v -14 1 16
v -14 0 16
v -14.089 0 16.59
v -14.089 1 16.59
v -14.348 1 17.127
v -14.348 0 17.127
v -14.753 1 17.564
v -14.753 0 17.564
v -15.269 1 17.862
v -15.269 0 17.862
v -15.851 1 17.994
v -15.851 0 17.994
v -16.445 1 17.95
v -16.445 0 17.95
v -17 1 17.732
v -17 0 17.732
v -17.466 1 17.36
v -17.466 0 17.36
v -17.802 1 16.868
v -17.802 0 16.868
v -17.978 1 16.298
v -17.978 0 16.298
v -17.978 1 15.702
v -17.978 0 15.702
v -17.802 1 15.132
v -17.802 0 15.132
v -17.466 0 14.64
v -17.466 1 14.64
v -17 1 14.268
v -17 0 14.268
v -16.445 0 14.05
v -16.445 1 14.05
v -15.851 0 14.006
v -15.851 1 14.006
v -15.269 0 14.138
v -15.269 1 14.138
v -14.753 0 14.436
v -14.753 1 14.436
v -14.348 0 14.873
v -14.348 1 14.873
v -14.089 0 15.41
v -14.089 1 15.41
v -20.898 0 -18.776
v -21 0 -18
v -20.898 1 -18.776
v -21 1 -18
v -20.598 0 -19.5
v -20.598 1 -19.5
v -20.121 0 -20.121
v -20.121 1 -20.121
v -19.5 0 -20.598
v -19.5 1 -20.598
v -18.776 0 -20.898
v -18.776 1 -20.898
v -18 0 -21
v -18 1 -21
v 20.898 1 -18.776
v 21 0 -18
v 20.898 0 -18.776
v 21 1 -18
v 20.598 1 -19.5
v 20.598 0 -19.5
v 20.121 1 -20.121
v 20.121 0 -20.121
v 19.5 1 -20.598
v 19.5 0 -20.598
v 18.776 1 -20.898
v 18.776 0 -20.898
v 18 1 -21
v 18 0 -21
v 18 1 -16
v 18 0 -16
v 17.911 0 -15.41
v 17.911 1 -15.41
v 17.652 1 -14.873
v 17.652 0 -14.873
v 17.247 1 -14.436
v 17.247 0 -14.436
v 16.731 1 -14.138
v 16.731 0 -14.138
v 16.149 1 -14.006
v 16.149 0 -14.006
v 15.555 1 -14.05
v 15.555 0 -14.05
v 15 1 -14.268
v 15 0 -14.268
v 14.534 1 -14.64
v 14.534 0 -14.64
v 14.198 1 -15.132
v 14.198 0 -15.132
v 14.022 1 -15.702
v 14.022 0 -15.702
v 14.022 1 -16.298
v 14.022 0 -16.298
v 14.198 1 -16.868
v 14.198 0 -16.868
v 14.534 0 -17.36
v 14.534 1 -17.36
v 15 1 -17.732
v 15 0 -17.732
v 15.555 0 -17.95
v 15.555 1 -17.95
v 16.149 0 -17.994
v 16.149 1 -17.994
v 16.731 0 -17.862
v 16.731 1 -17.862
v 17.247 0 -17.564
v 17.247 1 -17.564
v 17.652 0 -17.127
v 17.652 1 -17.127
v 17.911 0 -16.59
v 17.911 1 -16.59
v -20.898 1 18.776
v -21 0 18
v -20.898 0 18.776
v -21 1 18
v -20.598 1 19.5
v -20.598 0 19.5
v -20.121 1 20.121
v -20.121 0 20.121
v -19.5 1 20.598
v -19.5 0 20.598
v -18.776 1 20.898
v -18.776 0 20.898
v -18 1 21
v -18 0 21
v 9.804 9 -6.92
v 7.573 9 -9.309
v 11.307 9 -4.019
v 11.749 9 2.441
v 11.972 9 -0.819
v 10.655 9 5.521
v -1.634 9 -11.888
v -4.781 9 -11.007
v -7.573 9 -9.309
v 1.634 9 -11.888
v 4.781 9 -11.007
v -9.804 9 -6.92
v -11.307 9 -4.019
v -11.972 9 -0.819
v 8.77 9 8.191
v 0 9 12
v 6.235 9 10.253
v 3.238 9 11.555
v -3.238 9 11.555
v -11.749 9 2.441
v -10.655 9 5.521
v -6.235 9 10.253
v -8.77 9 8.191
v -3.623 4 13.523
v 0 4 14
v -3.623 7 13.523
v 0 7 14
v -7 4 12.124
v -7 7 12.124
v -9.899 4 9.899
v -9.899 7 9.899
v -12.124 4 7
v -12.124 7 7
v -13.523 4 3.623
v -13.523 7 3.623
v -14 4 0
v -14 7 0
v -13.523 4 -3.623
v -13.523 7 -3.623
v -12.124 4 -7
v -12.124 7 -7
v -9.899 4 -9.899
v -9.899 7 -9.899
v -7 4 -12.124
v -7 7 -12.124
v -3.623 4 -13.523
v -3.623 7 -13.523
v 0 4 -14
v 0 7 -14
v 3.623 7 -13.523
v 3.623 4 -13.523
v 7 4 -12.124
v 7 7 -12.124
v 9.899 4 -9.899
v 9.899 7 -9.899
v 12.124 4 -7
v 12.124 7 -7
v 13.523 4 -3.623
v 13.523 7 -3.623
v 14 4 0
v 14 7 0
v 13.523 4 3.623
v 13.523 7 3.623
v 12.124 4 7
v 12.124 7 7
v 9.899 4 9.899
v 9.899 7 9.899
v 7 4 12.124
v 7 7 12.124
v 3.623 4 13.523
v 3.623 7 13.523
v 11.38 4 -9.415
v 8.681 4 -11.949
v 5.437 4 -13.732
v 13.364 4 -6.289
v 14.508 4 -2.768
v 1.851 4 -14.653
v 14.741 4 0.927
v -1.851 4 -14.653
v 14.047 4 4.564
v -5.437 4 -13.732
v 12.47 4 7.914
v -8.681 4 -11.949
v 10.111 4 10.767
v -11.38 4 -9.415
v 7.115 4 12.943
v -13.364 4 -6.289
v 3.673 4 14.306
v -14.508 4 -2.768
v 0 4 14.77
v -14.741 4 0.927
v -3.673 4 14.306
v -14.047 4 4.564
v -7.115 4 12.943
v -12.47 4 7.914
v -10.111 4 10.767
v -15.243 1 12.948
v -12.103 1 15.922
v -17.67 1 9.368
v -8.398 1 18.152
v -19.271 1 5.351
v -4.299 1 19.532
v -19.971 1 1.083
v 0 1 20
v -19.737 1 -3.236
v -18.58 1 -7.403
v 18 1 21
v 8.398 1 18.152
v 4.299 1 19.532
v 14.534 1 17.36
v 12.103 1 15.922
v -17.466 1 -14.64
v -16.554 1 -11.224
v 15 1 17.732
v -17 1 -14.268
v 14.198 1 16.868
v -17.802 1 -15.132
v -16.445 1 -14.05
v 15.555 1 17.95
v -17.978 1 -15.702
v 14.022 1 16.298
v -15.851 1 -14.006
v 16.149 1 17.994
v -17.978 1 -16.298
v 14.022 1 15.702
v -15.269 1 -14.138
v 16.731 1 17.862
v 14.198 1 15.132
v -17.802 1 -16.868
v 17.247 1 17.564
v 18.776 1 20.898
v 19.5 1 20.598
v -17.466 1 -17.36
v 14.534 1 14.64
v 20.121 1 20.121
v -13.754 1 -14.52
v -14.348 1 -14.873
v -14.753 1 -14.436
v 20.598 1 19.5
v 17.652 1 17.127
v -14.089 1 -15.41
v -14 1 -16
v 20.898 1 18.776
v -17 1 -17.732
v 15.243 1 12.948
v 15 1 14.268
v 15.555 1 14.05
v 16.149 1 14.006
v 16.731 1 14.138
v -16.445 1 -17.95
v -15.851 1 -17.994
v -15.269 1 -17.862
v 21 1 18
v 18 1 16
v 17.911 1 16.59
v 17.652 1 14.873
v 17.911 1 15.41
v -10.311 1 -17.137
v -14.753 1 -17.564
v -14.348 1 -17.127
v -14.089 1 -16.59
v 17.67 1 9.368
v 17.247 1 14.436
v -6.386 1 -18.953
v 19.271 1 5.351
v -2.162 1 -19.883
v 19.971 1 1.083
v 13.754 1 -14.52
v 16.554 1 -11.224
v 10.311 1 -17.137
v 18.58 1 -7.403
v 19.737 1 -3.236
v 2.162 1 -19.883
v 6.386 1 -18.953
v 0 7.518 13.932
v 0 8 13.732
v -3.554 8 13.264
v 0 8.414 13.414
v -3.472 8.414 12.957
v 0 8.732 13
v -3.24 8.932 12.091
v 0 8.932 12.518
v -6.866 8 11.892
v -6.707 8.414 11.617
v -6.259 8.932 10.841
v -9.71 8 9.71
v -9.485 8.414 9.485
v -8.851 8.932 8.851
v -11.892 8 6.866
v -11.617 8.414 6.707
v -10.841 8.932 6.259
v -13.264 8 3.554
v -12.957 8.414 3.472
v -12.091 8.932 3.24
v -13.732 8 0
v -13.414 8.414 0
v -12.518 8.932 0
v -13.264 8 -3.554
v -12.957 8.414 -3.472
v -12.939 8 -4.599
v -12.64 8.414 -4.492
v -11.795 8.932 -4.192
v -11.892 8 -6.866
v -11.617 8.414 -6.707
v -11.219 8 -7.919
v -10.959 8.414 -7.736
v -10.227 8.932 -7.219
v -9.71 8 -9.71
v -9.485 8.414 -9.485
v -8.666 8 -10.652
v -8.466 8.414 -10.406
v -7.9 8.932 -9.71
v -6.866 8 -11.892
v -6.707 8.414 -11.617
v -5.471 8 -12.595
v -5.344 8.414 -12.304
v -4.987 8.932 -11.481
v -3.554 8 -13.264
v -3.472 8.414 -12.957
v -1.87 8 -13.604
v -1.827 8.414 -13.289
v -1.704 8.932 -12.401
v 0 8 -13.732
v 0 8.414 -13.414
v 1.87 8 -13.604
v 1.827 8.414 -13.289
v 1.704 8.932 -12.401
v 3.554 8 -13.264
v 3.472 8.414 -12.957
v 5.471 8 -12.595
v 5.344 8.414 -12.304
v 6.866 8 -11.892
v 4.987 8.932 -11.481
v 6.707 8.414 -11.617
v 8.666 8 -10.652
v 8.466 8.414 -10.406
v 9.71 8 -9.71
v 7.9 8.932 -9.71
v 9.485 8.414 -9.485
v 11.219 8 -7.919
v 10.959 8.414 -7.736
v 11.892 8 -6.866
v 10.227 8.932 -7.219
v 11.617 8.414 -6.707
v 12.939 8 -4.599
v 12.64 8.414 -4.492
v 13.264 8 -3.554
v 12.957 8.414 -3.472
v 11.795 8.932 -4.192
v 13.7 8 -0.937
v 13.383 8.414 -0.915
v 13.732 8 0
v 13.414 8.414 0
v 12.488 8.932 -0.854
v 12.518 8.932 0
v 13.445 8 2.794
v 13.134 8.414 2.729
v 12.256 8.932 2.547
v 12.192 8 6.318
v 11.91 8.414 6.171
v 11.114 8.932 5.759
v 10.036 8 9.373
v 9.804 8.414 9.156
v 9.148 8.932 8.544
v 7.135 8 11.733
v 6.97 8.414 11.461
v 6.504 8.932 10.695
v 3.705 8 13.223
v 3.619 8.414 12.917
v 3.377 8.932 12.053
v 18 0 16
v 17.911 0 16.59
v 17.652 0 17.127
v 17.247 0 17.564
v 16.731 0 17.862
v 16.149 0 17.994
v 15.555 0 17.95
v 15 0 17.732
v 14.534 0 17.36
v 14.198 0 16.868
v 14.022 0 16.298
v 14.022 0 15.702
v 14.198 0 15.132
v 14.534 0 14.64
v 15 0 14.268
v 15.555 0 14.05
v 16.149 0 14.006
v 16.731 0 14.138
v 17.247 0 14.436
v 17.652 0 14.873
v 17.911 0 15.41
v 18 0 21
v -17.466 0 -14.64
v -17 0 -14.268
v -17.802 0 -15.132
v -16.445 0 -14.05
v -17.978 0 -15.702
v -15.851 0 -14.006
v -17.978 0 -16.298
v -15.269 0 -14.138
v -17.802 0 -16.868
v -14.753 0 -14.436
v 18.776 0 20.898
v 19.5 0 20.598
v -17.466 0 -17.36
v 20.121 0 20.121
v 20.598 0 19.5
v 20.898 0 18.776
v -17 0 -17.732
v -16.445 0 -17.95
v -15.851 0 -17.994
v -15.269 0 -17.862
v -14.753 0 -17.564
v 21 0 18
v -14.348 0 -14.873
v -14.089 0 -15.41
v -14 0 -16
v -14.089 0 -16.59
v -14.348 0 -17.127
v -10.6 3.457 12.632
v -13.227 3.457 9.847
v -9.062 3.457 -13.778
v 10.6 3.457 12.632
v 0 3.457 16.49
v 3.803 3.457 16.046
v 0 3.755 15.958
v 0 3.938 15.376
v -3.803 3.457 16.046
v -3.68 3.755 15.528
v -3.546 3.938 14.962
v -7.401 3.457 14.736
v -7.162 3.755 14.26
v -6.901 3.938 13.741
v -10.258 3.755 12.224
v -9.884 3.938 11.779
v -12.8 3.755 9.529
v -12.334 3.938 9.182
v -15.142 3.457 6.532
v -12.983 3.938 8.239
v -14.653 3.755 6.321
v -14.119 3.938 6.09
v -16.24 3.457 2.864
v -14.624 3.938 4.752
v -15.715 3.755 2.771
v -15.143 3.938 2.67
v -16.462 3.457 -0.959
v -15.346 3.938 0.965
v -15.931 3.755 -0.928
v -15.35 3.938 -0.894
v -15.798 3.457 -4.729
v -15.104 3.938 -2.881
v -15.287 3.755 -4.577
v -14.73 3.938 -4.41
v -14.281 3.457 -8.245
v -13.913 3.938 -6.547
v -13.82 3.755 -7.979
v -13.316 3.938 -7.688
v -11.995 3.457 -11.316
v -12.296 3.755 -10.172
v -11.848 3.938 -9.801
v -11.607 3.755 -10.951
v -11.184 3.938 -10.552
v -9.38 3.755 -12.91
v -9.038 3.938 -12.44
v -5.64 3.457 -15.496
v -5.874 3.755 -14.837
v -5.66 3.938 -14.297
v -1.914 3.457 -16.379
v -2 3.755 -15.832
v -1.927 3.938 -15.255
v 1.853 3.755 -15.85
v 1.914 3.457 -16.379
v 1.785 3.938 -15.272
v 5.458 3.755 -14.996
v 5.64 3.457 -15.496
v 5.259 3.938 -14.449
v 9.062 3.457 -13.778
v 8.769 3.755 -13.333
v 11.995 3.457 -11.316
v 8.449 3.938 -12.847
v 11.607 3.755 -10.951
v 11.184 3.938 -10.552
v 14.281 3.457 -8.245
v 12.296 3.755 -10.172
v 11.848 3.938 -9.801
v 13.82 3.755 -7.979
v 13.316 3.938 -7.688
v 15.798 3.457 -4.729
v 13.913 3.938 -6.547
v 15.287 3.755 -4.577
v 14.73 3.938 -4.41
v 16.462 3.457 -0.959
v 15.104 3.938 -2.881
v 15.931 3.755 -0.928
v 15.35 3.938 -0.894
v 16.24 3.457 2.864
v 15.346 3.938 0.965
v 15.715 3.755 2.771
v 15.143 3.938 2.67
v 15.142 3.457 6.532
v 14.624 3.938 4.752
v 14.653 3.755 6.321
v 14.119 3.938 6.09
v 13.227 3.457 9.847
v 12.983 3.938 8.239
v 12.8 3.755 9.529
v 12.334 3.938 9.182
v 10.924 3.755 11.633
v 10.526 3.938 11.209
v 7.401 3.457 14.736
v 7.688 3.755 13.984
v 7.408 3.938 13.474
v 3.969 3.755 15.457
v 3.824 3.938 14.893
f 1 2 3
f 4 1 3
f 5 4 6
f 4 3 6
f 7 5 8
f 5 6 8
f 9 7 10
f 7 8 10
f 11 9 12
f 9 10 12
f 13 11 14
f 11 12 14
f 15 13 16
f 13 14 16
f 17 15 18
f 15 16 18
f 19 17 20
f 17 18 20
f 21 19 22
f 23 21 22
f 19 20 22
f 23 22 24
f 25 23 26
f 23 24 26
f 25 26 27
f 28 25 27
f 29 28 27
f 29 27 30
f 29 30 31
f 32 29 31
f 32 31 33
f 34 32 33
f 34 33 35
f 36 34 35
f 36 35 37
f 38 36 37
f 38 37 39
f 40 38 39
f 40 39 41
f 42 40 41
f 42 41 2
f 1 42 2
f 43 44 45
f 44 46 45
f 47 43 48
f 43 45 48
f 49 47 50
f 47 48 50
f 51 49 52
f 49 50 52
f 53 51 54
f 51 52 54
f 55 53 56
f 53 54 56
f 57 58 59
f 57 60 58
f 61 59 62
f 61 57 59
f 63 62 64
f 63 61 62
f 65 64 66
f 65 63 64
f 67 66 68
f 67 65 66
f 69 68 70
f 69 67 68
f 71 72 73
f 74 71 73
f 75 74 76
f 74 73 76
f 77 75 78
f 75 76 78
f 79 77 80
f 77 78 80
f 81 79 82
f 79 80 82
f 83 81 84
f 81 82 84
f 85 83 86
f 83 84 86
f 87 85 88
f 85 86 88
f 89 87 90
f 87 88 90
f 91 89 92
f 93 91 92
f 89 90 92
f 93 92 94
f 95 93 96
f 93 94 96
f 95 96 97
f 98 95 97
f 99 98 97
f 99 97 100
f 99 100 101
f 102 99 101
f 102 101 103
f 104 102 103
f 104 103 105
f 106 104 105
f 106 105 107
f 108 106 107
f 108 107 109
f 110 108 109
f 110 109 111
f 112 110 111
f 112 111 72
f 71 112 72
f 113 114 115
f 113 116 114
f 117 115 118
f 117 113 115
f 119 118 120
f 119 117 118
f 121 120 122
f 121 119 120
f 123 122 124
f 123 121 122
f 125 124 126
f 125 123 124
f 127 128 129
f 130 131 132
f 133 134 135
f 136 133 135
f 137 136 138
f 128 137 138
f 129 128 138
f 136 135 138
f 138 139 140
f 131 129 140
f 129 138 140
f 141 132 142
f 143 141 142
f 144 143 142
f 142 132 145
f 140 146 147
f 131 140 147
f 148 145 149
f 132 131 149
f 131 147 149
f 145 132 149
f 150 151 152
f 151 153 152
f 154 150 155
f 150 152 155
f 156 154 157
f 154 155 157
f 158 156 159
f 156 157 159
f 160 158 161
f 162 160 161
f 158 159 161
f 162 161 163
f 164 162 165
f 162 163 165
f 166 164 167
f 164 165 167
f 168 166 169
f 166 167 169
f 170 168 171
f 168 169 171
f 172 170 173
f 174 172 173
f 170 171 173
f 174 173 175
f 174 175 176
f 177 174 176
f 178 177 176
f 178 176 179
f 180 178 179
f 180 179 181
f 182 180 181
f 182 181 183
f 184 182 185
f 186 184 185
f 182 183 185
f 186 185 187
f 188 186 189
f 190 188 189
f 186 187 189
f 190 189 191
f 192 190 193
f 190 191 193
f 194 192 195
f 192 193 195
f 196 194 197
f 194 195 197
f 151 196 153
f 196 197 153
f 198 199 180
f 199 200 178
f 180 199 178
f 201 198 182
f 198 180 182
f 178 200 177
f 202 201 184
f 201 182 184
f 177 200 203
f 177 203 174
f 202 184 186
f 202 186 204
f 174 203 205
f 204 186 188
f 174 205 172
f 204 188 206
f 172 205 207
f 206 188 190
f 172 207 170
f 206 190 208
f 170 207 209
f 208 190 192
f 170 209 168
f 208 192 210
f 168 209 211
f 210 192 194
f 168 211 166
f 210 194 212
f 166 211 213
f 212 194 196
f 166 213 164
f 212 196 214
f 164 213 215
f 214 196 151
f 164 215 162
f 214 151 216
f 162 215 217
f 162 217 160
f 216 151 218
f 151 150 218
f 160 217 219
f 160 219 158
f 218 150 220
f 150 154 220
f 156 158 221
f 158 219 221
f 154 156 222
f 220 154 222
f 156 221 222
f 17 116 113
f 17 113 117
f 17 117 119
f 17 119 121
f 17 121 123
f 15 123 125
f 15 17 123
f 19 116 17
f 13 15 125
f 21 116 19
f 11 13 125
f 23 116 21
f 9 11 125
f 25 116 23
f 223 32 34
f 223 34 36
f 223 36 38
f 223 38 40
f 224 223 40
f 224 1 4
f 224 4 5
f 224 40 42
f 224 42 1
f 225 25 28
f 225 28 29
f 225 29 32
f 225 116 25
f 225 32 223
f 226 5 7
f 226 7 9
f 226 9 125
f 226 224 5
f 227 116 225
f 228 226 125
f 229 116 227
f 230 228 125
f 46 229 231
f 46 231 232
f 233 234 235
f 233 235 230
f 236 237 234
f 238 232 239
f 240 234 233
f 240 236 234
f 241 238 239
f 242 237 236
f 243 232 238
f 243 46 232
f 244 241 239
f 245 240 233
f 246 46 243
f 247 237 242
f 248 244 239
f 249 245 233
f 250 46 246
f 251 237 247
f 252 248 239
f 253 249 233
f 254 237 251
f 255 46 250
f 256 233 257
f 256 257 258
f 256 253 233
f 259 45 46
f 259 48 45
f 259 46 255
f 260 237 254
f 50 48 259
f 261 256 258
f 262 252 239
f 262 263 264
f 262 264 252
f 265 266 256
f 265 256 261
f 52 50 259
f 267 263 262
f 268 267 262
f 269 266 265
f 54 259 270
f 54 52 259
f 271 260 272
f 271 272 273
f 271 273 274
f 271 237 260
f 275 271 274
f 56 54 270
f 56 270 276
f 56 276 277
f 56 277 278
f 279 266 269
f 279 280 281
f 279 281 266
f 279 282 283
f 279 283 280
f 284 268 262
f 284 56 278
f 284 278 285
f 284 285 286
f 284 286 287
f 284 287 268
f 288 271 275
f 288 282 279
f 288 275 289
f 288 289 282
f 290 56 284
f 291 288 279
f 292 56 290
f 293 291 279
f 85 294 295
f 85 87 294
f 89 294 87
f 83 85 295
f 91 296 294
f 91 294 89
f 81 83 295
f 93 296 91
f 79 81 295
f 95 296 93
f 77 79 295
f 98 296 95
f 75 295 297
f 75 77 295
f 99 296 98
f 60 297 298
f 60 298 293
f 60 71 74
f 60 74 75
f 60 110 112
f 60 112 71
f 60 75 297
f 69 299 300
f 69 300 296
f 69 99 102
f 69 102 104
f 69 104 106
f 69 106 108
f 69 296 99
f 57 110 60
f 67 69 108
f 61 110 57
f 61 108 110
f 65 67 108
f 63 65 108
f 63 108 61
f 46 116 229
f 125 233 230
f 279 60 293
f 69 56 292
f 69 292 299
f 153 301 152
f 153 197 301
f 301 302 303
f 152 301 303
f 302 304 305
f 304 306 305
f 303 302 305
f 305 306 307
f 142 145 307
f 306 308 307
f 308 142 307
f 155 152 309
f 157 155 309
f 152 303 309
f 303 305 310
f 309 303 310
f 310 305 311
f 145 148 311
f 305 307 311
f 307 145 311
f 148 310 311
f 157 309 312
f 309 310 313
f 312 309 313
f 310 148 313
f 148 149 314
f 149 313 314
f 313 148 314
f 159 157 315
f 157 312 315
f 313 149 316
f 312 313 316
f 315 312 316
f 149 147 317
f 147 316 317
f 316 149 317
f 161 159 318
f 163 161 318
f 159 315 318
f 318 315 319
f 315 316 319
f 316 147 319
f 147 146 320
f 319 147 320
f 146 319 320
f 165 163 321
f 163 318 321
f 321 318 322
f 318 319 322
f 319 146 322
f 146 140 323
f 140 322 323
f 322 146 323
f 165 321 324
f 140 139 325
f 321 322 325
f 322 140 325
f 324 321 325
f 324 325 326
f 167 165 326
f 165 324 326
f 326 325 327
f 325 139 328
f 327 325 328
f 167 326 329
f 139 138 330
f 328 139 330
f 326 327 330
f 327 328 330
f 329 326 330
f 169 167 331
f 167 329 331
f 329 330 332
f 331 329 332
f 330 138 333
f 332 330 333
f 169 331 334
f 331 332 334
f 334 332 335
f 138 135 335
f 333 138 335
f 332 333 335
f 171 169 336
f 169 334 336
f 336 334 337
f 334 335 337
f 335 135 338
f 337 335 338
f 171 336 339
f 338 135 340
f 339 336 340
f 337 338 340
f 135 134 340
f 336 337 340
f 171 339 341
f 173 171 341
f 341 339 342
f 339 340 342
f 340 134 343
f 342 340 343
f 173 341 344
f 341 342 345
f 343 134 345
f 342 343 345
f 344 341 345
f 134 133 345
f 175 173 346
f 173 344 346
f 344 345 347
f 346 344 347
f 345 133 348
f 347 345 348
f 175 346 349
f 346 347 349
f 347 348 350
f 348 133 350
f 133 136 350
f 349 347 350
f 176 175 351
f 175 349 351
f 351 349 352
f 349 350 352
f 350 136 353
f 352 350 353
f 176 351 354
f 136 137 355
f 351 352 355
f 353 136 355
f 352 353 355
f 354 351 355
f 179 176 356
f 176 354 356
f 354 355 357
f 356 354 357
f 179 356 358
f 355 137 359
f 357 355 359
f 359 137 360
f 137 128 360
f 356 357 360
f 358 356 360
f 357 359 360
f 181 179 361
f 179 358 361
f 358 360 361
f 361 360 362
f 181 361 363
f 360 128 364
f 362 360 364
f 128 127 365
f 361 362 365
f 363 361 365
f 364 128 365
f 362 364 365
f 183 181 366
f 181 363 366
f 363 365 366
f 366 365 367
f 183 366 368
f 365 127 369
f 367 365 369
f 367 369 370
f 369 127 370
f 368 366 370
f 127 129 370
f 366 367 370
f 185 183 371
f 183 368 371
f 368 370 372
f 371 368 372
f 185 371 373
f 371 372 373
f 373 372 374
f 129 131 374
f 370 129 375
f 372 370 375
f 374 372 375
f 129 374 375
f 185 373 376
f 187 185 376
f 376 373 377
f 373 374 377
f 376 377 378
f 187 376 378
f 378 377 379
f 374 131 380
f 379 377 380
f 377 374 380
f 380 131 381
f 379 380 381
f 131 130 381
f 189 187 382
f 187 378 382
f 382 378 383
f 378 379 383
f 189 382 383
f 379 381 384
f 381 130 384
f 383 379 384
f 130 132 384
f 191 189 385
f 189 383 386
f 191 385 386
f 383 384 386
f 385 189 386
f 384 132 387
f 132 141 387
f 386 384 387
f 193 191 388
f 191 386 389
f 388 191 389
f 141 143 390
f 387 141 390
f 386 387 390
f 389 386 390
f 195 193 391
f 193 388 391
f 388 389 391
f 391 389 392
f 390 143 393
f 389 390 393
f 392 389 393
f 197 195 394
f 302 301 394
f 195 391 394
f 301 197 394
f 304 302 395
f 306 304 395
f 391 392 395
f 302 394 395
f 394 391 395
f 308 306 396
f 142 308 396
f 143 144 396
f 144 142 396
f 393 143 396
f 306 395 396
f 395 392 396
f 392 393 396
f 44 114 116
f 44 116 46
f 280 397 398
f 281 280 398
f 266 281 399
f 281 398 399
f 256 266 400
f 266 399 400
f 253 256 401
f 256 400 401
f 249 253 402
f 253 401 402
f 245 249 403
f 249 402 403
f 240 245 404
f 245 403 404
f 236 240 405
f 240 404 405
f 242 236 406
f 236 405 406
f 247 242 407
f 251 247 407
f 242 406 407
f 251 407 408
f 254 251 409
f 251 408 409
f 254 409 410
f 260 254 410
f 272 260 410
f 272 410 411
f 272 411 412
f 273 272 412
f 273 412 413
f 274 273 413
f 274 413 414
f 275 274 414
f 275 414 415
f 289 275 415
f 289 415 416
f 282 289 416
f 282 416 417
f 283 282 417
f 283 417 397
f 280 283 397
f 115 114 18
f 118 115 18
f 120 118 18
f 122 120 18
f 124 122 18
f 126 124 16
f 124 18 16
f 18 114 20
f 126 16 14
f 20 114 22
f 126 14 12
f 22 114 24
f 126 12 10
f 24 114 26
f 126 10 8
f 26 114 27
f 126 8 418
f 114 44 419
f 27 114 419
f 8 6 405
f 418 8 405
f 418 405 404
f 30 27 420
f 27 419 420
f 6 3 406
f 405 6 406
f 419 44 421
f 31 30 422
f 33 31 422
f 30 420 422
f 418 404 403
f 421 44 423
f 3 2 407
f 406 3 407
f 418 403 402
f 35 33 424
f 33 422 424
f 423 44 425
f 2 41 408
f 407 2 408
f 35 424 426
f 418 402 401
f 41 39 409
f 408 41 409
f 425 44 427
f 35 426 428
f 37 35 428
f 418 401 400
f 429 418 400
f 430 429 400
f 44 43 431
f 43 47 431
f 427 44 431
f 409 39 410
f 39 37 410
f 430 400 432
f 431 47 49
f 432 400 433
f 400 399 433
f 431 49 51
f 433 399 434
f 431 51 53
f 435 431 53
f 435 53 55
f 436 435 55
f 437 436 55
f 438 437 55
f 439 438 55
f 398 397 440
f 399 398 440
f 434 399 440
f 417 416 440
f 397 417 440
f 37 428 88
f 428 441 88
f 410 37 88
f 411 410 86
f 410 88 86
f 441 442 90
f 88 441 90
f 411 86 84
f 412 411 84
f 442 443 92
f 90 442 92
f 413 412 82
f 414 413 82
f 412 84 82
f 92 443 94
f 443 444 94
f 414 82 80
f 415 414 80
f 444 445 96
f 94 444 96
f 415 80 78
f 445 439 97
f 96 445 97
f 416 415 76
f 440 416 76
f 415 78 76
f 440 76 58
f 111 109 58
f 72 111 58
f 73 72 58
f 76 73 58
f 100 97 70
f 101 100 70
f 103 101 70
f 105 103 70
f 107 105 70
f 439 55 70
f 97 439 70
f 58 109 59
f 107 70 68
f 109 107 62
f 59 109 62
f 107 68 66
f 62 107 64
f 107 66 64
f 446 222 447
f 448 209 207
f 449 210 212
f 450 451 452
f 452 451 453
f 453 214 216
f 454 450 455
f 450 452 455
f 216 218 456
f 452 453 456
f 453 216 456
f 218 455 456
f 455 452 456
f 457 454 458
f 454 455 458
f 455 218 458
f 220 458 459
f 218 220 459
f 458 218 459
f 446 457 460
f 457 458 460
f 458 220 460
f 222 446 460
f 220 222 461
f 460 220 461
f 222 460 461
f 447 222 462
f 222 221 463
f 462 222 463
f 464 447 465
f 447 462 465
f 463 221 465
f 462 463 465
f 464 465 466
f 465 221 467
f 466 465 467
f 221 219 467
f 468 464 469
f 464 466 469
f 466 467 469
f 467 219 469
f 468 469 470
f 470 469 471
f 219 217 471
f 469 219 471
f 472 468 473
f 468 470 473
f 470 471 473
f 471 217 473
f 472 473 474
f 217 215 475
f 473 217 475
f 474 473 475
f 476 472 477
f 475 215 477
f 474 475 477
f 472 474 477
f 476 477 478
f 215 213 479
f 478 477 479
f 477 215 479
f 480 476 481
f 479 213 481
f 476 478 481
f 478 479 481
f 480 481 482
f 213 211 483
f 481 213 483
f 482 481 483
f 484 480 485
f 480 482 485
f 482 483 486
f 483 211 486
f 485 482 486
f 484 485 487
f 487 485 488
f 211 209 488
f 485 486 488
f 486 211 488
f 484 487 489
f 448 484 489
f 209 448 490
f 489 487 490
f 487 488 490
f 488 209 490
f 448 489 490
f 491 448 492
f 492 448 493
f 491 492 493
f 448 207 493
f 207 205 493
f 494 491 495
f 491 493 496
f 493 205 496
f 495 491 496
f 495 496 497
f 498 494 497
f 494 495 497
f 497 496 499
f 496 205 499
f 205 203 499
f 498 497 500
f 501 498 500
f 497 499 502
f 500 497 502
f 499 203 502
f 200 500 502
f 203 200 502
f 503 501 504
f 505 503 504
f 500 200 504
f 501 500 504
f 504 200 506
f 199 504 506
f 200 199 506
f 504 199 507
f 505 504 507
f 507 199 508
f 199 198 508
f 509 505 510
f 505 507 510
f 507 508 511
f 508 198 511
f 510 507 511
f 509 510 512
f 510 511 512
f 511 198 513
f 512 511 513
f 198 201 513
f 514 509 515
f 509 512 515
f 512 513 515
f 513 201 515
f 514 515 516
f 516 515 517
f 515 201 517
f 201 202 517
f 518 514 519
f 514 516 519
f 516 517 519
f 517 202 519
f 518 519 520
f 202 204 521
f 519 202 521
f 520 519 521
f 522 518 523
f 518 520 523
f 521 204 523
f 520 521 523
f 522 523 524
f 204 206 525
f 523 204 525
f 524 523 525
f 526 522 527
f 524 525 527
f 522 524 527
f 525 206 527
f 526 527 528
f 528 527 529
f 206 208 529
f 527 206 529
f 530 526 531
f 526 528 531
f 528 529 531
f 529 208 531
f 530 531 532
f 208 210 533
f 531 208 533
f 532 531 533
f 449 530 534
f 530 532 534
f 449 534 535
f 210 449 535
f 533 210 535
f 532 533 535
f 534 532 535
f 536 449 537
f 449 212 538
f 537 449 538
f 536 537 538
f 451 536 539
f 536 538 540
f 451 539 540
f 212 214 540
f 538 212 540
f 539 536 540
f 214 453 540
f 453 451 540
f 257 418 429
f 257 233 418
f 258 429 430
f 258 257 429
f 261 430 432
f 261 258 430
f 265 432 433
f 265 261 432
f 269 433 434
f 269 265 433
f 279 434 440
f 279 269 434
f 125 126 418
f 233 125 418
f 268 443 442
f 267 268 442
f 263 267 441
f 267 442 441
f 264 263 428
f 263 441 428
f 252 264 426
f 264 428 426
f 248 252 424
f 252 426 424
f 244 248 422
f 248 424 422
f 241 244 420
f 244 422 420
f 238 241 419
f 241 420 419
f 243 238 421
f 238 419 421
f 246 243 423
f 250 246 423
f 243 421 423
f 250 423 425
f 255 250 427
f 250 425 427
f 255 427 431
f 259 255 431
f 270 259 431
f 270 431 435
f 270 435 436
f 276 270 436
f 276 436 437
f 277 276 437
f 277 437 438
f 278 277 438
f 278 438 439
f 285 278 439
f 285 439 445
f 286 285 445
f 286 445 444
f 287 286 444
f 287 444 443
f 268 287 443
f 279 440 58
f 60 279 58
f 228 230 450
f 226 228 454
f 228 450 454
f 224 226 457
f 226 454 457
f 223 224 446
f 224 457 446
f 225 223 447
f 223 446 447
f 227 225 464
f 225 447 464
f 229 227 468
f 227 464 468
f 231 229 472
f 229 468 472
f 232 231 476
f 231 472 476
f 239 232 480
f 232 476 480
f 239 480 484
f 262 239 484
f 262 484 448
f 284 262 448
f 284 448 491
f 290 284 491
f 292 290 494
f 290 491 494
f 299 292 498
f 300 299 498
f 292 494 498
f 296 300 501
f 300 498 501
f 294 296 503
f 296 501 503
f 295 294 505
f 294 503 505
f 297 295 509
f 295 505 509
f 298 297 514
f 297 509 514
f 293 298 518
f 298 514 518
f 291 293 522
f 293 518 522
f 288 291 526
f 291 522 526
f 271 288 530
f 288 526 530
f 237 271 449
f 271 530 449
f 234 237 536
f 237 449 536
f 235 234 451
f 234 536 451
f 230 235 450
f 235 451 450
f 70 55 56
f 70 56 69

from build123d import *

# Parameters (mm, degrees)
ESQUISSE1_W             = 42
ESQUISSE1_H             = 42
BOSS_EXTRU_1_DEPTH      = 1
CONG_1_R                = 3
ENL_V_MAT_EXTRU_1_REACH = 11
ESQUISSE3_R             = 2


with BuildPart() as part:
    # Esquisse1 → Boss.-Extru.1 (new body)
    with BuildSketch(Plane(origin=(0, 0, 0), x_dir=(1, 0, 0), z_dir=(0, 1, 0))):
        Rectangle(ESQUISSE1_W, ESQUISSE1_H)
    extrude(amount=BOSS_EXTRU_1_DEPTH)

    # Congé1
    cong_1_edges = [part.edges().sort_by_distance(p)[0] for p in [
        (-21, 0.5, -21),
        (21, 0.5, -21),
        (21, 0.5, 21),
        (-21, 0.5, 21),
    ]]
    fillet(cong_1_edges, radius=CONG_1_R)

    # Esquisse2 → Révolution1 (revolve)
    with BuildSketch(Plane(origin=(0, 0, 0), x_dir=(0, 0, -1), z_dir=(1, 0, 0))):
        with BuildLine():
            Line((-20, 1), (-16.490388922, 3.457456133))
            ThreePointArc((-16.490388922, 3.457456133), (-15.671777012, 3.861150852), (-14.769659613, 4))
            Line((-14.769659613, 4), (-14, 4))
            Line((-14, 4), (-14, 7))
            ThreePointArc((-14, 7), (-13.414213562, 8.414213562), (-12, 9))
            Line((-12, 9), (0, 9))
            Line((0, 9), (0, 4))
            Line((0, 4), (0, 1))
            Line((0, 1), (-20, 1))
        make_face()
    revolve(axis=Axis((0, 4, 0), (0, -1, 0)))

    # Esquisse3 → Enlèv. mat.-Extru.1 (cut, up to next)
    with BuildSketch(Plane.XZ, mode=Mode.PRIVATE) as enl_v_mat_extru_1_sk1:
        with Locations((-16, 16)):
            Circle(ESQUISSE3_R)
    enl_v_mat_extru_1_tool1 = extrude(enl_v_mat_extru_1_sk1.sketch, amount=-ENL_V_MAT_EXTRU_1_REACH, mode=Mode.PRIVATE) & part.part
    add(enl_v_mat_extru_1_tool1.solids().sort_by_distance((-16, 0, 16))[0], mode=Mode.SUBTRACT)
    # Esquisse3 → Enlèv. mat.-Extru.1 (cut, up to next)
    with BuildSketch(Plane.XZ, mode=Mode.PRIVATE) as enl_v_mat_extru_1_sk2:
        with Locations((16, 16)):
            Circle(ESQUISSE3_R)
    enl_v_mat_extru_1_tool2 = extrude(enl_v_mat_extru_1_sk2.sketch, amount=-ENL_V_MAT_EXTRU_1_REACH, mode=Mode.PRIVATE) & part.part
    add(enl_v_mat_extru_1_tool2.solids().sort_by_distance((16, 0, 16))[0], mode=Mode.SUBTRACT)
    # Esquisse3 → Enlèv. mat.-Extru.1 (cut, up to next)
    with BuildSketch(Plane.XZ, mode=Mode.PRIVATE) as enl_v_mat_extru_1_sk3:
        with Locations((-16, -16)):
            Circle(ESQUISSE3_R)
    enl_v_mat_extru_1_tool3 = extrude(enl_v_mat_extru_1_sk3.sketch, amount=-ENL_V_MAT_EXTRU_1_REACH, mode=Mode.PRIVATE) & part.part
    add(enl_v_mat_extru_1_tool3.solids().sort_by_distance((-16, 0, -16))[0], mode=Mode.SUBTRACT)
    # Esquisse3 → Enlèv. mat.-Extru.1 (cut, up to next)
    with BuildSketch(Plane.XZ, mode=Mode.PRIVATE) as enl_v_mat_extru_1_sk4:
        with Locations((16, -16)):
            Circle(ESQUISSE3_R)
    enl_v_mat_extru_1_tool4 = extrude(enl_v_mat_extru_1_sk4.sketch, amount=-ENL_V_MAT_EXTRU_1_REACH, mode=Mode.PRIVATE) & part.part
    add(enl_v_mat_extru_1_tool4.solids().sort_by_distance((16, 0, -16))[0], mode=Mode.SUBTRACT)


solid = part.part
